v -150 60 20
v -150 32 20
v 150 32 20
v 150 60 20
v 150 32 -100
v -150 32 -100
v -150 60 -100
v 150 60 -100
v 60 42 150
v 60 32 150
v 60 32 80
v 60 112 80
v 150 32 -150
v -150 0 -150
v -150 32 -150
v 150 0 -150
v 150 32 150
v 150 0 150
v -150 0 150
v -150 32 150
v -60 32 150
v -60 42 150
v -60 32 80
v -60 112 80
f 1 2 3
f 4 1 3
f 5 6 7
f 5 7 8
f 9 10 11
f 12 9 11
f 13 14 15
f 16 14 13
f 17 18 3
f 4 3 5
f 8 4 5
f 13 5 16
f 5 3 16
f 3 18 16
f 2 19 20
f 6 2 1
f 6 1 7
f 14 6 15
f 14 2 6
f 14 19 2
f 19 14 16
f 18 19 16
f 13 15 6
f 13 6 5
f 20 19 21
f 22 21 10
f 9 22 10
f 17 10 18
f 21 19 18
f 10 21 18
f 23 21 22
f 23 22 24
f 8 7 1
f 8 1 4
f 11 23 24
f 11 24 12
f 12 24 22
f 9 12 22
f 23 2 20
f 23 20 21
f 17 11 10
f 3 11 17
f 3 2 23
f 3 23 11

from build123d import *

# Parameters (mm, degrees)
SKETCH1_W           = 300
SKETCH1_H           = 300
BOSS_EXTRUDE1_DEPTH = 32
SKETCH2_W           = 300
SKETCH2_H           = 120
BOSS_EXTRUDE2_DEPTH = 28
SKETCH3_W           = 120
SKETCH3_H           = 70
BOSS_EXTRUDE3_DEPTH = 80
CUT_EXTRUDE1_DEPTH  = 120


with BuildPart() as part:
    # Sketch1 → Boss-Extrude1 (new body)
    with BuildSketch(Plane(origin=(0, 0, 0), x_dir=(1, 0, 0), z_dir=(0, 1, 0))):
        Rectangle(SKETCH1_W, SKETCH1_H)
    extrude(amount=BOSS_EXTRUDE1_DEPTH)

    # Sketch2 → Boss-Extrude2 (add)
    with BuildSketch(Plane(origin=(0, 32, 0), x_dir=(1, 0, 0), z_dir=(0, 1, 0))):
        with Locations((0, 40)):
            Rectangle(SKETCH2_W, SKETCH2_H)
    extrude(amount=BOSS_EXTRUDE2_DEPTH)

    # Sketch3 → Boss-Extrude3 (add)
    with BuildSketch(Plane(origin=(0, 32, 0), x_dir=(1, 0, 0), z_dir=(0, 1, 0))):
        with Locations((0, -115)):
            Rectangle(SKETCH3_W, SKETCH3_H)
    extrude(amount=BOSS_EXTRUDE3_DEPTH)

    # Sketch4 → Cut-Extrude1 (cut)
    with BuildSketch(Plane(origin=(60, 0, 0), x_dir=(0, 0, -1), z_dir=(1, 0, 0))):
        Polygon((-80, 112), (-150, 42), (-150, 112), align=None)
    extrude(amount=-CUT_EXTRUDE1_DEPTH, mode=Mode.SUBTRACT)


solid = part.part
